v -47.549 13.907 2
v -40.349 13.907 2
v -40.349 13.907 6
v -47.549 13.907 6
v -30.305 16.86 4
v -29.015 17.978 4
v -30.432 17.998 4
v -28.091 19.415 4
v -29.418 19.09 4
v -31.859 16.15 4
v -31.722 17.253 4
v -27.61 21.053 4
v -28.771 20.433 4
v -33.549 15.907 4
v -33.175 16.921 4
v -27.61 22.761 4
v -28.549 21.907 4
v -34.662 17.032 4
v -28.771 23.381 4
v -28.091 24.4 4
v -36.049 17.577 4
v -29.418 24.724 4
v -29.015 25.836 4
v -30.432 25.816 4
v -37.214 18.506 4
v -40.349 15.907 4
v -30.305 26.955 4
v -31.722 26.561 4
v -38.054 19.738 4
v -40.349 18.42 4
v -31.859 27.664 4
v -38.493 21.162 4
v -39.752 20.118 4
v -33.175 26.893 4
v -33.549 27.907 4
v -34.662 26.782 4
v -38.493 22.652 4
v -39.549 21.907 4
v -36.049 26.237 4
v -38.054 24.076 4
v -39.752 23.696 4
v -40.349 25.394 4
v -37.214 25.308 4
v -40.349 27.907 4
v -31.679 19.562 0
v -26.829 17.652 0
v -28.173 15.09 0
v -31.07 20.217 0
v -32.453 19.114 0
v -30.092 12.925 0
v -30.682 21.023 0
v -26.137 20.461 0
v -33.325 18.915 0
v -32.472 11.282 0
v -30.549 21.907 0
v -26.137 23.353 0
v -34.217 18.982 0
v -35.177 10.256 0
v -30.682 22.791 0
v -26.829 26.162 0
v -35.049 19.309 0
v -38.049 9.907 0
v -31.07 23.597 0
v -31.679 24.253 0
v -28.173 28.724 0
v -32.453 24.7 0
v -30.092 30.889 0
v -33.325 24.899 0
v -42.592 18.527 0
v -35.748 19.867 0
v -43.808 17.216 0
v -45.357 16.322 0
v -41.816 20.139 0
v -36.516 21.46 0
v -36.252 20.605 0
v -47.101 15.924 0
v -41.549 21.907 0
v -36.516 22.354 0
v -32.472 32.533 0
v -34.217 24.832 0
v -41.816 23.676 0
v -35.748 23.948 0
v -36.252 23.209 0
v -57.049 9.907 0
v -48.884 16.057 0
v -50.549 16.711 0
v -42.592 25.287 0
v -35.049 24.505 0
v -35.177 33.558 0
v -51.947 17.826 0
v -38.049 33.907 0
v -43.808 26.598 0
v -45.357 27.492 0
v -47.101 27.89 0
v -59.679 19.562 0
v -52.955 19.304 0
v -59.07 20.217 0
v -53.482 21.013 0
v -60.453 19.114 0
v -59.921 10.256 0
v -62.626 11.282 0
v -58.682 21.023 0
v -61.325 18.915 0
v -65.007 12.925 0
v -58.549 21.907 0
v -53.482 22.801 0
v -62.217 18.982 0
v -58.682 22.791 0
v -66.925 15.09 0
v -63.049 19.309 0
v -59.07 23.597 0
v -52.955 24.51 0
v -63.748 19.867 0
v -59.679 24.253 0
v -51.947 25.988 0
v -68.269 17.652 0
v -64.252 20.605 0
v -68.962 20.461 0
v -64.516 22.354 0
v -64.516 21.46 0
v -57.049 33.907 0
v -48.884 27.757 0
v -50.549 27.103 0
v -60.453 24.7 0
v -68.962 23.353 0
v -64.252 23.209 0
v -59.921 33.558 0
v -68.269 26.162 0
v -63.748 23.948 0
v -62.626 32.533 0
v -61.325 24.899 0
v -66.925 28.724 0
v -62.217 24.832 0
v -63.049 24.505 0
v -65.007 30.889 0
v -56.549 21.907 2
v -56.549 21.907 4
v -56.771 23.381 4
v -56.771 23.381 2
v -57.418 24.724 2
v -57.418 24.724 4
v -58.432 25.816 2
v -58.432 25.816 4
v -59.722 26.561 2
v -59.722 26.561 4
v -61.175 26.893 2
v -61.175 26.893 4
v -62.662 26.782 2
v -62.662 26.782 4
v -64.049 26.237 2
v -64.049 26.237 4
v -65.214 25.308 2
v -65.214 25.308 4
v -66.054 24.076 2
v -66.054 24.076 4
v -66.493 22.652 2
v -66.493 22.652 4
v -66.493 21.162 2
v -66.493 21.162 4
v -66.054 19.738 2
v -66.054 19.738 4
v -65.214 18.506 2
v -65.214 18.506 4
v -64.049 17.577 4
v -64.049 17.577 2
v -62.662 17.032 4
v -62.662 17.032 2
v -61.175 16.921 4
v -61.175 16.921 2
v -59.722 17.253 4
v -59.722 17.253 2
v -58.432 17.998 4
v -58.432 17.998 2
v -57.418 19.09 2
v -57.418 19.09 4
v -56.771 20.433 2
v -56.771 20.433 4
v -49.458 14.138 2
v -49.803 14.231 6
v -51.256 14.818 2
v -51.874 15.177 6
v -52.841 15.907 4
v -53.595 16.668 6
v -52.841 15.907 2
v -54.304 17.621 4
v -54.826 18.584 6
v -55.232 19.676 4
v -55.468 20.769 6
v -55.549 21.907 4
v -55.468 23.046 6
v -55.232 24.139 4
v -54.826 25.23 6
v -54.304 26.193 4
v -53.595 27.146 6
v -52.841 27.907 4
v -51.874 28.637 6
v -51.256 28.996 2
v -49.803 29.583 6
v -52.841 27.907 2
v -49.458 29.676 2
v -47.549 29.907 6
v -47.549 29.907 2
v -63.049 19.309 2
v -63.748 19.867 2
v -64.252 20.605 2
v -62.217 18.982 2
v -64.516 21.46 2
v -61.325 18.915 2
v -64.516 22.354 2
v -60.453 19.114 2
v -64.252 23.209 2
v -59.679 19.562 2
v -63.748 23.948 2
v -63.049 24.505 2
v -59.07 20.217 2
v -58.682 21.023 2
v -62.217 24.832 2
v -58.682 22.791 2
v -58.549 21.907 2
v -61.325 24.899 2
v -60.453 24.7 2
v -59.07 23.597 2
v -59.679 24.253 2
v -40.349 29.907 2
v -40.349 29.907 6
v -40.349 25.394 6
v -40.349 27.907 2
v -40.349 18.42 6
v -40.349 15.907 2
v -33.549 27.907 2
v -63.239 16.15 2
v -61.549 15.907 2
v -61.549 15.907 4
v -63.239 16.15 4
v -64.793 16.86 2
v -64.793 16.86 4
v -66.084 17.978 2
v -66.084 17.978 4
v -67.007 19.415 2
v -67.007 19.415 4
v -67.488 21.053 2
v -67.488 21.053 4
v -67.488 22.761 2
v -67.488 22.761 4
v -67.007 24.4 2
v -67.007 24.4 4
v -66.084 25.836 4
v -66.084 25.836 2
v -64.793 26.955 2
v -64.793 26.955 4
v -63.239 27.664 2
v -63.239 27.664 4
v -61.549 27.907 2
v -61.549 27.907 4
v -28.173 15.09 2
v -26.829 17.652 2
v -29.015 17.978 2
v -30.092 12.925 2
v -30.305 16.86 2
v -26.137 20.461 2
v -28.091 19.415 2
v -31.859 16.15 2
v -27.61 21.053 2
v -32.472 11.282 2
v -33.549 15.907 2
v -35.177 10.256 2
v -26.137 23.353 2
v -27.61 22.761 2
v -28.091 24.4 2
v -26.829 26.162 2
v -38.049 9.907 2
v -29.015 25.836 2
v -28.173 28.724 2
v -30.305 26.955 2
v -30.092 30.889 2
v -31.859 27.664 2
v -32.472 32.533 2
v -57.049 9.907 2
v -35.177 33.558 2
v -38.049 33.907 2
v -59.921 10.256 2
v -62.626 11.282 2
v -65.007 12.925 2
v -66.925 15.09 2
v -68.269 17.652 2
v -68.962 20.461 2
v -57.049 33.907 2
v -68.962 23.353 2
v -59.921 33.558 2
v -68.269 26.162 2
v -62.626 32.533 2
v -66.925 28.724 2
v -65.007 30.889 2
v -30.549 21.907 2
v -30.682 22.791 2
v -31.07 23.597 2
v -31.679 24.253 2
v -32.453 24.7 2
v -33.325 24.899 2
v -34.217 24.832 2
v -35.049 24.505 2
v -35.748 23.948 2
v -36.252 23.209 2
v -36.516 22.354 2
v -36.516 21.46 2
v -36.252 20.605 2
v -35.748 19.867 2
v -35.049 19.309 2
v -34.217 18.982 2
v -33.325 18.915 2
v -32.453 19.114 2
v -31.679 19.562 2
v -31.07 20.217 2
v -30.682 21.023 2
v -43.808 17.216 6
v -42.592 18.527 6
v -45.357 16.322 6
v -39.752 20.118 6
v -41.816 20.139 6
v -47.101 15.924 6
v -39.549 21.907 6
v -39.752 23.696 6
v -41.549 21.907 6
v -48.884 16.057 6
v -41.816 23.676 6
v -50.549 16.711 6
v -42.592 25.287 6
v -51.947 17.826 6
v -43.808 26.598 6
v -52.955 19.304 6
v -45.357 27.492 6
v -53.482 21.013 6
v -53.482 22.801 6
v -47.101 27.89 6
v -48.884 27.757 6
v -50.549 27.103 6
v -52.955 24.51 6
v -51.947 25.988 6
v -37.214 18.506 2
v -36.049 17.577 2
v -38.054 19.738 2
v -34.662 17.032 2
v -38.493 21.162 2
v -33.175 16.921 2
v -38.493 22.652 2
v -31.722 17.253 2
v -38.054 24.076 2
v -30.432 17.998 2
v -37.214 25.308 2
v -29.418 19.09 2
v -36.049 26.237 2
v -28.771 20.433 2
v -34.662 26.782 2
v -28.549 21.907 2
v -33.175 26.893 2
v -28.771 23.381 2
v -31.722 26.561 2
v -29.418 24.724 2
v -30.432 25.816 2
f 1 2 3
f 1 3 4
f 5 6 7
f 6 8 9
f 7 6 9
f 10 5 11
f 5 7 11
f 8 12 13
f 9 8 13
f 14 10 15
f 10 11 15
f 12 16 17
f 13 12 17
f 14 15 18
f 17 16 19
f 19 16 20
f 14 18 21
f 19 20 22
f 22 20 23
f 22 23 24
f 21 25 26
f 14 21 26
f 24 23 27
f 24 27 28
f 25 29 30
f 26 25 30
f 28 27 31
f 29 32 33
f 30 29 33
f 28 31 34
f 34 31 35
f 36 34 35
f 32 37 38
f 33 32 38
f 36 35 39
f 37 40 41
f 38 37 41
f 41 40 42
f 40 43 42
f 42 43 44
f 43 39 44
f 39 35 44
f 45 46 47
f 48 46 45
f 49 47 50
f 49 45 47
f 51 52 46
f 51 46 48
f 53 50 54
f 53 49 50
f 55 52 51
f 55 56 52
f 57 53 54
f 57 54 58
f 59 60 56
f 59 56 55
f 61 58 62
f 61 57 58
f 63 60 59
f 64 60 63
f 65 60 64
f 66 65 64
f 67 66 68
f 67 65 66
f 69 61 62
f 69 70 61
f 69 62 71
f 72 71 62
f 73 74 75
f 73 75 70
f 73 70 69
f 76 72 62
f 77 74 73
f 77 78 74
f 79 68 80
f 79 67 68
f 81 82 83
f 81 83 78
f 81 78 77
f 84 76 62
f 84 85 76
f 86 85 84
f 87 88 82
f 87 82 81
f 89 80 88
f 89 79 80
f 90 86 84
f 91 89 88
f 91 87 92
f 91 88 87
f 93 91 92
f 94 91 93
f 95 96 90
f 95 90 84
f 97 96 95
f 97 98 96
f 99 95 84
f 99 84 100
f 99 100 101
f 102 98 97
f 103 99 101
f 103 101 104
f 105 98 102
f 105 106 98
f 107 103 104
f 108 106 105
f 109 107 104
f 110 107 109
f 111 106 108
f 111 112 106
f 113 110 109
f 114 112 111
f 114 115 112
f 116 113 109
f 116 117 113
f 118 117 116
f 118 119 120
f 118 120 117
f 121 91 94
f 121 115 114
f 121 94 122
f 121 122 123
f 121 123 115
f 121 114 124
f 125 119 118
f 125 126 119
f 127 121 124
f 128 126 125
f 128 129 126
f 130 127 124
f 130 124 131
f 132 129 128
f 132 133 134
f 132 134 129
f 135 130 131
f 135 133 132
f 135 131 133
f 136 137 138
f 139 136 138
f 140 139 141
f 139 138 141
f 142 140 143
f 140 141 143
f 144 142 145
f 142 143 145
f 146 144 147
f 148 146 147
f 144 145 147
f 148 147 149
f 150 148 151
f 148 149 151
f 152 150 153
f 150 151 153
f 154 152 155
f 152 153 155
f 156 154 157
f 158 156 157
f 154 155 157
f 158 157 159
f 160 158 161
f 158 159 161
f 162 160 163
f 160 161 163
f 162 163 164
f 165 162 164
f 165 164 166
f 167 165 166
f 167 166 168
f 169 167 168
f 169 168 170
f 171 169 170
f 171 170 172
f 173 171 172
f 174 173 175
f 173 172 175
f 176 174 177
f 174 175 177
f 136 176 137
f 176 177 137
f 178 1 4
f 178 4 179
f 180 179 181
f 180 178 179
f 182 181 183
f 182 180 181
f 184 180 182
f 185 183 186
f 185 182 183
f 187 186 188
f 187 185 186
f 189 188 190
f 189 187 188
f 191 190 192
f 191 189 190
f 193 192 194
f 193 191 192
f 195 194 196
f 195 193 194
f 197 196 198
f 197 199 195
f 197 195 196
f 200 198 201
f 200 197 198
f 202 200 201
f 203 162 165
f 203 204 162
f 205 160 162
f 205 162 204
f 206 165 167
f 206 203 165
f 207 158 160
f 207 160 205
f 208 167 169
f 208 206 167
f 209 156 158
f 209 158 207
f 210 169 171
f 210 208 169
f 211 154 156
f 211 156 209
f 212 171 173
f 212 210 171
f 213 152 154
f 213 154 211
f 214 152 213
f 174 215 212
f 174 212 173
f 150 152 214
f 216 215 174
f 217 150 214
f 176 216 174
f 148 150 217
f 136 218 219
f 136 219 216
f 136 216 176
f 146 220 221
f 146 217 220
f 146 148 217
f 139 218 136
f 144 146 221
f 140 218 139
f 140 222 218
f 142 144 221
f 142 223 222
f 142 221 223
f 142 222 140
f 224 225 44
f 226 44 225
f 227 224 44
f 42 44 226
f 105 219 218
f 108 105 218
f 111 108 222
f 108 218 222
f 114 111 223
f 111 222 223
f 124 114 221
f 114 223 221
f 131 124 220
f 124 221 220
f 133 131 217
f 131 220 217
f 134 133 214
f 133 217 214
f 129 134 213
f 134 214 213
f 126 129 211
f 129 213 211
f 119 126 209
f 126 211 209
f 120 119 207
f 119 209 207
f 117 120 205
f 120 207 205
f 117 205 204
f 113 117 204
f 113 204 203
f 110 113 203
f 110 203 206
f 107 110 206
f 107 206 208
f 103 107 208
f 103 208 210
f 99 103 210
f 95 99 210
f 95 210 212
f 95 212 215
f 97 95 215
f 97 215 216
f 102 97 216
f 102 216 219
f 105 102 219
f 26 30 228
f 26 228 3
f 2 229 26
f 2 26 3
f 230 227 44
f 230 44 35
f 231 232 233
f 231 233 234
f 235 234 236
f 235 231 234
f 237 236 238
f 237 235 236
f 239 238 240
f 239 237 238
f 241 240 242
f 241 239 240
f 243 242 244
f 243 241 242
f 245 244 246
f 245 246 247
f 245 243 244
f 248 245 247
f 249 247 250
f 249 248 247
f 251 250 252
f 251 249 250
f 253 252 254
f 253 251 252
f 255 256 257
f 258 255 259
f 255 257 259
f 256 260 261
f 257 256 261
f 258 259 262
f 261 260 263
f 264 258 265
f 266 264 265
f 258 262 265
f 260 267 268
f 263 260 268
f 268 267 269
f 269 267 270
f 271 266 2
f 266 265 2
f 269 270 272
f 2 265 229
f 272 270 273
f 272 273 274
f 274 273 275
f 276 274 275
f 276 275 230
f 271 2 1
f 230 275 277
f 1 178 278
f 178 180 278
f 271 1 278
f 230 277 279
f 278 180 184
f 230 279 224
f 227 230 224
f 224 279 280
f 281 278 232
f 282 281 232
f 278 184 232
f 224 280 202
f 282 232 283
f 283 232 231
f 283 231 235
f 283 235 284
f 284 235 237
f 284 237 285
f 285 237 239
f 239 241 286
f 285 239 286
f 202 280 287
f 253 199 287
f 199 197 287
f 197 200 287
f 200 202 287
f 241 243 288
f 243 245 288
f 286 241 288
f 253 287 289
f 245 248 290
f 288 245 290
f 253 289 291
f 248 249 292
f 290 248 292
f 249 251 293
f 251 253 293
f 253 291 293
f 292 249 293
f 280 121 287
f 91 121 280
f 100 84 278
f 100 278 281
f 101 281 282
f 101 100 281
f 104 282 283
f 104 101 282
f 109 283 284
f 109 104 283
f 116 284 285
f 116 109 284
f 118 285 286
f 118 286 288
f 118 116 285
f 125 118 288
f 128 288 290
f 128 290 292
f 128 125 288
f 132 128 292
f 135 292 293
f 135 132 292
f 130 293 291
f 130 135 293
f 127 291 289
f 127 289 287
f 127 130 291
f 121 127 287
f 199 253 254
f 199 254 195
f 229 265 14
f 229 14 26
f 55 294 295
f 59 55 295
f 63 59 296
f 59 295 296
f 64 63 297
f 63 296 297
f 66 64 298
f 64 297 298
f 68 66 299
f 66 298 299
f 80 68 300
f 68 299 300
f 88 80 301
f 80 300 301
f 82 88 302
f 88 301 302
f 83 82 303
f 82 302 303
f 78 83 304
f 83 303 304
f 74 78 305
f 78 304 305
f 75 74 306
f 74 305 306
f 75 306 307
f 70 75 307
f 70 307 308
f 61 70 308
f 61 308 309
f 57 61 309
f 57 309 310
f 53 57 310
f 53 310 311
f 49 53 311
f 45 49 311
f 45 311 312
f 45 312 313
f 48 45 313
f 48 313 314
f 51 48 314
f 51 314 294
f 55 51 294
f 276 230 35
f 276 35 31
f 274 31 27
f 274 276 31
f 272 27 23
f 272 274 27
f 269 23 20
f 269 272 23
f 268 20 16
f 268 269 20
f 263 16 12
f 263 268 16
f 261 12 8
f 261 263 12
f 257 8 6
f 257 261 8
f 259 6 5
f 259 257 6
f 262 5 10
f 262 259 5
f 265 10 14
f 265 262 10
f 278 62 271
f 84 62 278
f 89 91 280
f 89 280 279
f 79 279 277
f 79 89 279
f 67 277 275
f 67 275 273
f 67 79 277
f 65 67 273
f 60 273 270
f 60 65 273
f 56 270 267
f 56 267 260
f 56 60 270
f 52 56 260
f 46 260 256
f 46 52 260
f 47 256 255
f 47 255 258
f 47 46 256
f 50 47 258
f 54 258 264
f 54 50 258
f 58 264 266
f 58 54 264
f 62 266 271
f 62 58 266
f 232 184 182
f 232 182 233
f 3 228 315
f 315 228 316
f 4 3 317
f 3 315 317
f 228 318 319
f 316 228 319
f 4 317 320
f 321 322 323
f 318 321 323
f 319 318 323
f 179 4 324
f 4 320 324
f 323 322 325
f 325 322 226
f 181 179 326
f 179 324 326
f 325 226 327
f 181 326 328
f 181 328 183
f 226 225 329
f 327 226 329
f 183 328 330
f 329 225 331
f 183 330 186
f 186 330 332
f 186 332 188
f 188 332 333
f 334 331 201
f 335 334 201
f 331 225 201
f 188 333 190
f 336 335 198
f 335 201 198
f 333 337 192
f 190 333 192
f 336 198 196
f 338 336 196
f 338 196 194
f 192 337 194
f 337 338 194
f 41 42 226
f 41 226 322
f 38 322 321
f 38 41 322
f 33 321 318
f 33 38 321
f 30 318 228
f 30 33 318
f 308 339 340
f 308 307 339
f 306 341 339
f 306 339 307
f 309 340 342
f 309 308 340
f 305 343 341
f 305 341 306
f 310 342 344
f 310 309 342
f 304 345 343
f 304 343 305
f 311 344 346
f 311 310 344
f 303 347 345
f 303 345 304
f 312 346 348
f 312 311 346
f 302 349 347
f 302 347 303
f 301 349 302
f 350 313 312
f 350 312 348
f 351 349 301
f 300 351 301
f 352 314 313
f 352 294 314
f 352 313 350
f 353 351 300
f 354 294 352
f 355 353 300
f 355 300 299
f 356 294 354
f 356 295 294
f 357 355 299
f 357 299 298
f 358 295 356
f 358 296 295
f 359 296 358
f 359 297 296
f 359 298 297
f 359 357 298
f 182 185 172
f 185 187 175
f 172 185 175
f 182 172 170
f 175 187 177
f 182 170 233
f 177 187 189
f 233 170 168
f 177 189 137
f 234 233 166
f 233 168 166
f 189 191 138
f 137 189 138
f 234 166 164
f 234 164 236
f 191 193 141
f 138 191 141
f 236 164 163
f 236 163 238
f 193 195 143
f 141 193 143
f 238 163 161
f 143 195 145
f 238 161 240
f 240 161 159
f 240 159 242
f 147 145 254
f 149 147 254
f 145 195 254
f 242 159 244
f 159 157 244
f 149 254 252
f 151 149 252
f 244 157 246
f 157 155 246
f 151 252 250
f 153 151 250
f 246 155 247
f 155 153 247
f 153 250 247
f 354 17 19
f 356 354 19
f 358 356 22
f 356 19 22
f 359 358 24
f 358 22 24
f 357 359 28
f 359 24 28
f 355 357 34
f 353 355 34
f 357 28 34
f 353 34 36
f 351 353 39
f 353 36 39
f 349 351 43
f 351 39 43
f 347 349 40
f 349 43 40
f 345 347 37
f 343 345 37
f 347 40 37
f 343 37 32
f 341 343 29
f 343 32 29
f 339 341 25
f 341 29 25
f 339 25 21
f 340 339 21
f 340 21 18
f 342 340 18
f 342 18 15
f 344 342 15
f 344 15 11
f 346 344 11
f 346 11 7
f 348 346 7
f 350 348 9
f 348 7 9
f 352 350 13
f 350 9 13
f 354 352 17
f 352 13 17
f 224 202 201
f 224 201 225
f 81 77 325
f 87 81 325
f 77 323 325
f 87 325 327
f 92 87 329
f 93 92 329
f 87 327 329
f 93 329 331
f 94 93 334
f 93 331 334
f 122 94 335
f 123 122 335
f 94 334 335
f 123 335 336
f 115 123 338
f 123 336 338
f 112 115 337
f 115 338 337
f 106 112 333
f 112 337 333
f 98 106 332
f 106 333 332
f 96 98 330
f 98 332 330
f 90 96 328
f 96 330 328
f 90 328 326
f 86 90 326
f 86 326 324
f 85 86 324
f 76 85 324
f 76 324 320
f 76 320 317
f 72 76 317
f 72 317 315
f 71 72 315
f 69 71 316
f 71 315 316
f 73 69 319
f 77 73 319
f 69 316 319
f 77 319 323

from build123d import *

# Parameters (mm, degrees)
EXTRUSION1_DEPTH        = 2
EXTRUSION4_DEPTH        = 2
EXTRUSION5_DEPTH        = 4
ESQUISSE3_R             = 6
ENL_V_MAT_EXTRU_1_DEPTH = 5
ESQUISSE5_R             = 3
ENL_V_MAT_EXTRU_2_DEPTH = 5
ESQUISSE6_R             = 5
ENL_V_MAT_EXTRU_3_DEPTH = 2


with BuildPart() as part:
    # Esquisse1 → Extrusion1 (new body)
    with BuildSketch(Plane.XY):
        with BuildLine():
            Line((-57.049073, 33.907042), (-38.049073, 33.907042))
            ThreePointArc((-38.049073, 33.907042), (-26.049073, 21.907042), (-38.049073, 9.907042))
            Line((-38.049073, 9.907042), (-57.049073, 9.907042))
            ThreePointArc((-57.049073, 9.907042), (-69.049073, 21.907042), (-57.049073, 33.907042))
        make_face()
    extrude(amount=EXTRUSION1_DEPTH)

    # Esquisse2 → Extrusion4 (add)
    with BuildSketch(Plane.XY.offset(2)):
        with BuildLine():
            Line((-61.549073, 27.907042), (-33.549073, 27.907042))
            ThreePointArc((-33.549073, 27.907042), (-27.549073, 21.907042), (-33.549073, 15.907042))
            Line((-33.549073, 15.907042), (-61.549073, 15.907042))
            ThreePointArc((-61.549073, 15.907042), (-67.549073, 21.907042), (-61.549073, 27.907042))
        make_face()
    extrude(amount=EXTRUSION4_DEPTH)

    # Esquisse4 → Extrusion5 (add)
    with BuildSketch(Plane.XY.offset(2)):
        with BuildLine():
            Line((-47.549305, 29.907042), (-40.349305, 29.907042))
            Line((-40.349305, 29.907042), (-40.349305, 25.394161155))
            ThreePointArc((-40.349305, 25.394161155), (-39.549305, 21.907042), (-40.349305, 18.419922845))
            Line((-40.349305, 18.419922845), (-40.349305, 13.907042))
            Line((-40.349305, 13.907042), (-47.549305, 13.907042))
            ThreePointArc((-47.549305, 13.907042), (-55.549305, 21.907042), (-47.549305, 29.907042))
        make_face()
    extrude(amount=EXTRUSION5_DEPTH)

    # Esquisse3 → Enlèv. mat.-Extru.1 (cut, symmetric)
    with BuildSketch(Plane.XY.offset(4)):
        with Locations((-47.549073, 21.907042)):
            Circle(ESQUISSE3_R)
    extrude(amount=ENL_V_MAT_EXTRU_1_DEPTH, both=True, mode=Mode.SUBTRACT)

    # Esquisse5 → Enlèv. mat.-Extru.2 (cut, through all)
    with BuildSketch(Plane.XY.offset(4)):
        with Locations((-61.549073, 21.907042)):
            Circle(ESQUISSE5_R)
        with Locations((-33.549073, 21.907042)):
            Circle(ESQUISSE5_R)
    extrude(amount=-ENL_V_MAT_EXTRU_2_DEPTH, mode=Mode.SUBTRACT)

    # Esquisse6 → Enlèv. mat.-Extru.3 (cut)
    with BuildSketch(Plane.XY.offset(4)):
        with Locations((-61.549073, 21.907042)):
            Circle(ESQUISSE6_R)
        with Locations((-33.549073, 21.907042)):
            Circle(ESQUISSE6_R)
    extrude(amount=-ENL_V_MAT_EXTRU_3_DEPTH, mode=Mode.SUBTRACT)


solid = part.part
